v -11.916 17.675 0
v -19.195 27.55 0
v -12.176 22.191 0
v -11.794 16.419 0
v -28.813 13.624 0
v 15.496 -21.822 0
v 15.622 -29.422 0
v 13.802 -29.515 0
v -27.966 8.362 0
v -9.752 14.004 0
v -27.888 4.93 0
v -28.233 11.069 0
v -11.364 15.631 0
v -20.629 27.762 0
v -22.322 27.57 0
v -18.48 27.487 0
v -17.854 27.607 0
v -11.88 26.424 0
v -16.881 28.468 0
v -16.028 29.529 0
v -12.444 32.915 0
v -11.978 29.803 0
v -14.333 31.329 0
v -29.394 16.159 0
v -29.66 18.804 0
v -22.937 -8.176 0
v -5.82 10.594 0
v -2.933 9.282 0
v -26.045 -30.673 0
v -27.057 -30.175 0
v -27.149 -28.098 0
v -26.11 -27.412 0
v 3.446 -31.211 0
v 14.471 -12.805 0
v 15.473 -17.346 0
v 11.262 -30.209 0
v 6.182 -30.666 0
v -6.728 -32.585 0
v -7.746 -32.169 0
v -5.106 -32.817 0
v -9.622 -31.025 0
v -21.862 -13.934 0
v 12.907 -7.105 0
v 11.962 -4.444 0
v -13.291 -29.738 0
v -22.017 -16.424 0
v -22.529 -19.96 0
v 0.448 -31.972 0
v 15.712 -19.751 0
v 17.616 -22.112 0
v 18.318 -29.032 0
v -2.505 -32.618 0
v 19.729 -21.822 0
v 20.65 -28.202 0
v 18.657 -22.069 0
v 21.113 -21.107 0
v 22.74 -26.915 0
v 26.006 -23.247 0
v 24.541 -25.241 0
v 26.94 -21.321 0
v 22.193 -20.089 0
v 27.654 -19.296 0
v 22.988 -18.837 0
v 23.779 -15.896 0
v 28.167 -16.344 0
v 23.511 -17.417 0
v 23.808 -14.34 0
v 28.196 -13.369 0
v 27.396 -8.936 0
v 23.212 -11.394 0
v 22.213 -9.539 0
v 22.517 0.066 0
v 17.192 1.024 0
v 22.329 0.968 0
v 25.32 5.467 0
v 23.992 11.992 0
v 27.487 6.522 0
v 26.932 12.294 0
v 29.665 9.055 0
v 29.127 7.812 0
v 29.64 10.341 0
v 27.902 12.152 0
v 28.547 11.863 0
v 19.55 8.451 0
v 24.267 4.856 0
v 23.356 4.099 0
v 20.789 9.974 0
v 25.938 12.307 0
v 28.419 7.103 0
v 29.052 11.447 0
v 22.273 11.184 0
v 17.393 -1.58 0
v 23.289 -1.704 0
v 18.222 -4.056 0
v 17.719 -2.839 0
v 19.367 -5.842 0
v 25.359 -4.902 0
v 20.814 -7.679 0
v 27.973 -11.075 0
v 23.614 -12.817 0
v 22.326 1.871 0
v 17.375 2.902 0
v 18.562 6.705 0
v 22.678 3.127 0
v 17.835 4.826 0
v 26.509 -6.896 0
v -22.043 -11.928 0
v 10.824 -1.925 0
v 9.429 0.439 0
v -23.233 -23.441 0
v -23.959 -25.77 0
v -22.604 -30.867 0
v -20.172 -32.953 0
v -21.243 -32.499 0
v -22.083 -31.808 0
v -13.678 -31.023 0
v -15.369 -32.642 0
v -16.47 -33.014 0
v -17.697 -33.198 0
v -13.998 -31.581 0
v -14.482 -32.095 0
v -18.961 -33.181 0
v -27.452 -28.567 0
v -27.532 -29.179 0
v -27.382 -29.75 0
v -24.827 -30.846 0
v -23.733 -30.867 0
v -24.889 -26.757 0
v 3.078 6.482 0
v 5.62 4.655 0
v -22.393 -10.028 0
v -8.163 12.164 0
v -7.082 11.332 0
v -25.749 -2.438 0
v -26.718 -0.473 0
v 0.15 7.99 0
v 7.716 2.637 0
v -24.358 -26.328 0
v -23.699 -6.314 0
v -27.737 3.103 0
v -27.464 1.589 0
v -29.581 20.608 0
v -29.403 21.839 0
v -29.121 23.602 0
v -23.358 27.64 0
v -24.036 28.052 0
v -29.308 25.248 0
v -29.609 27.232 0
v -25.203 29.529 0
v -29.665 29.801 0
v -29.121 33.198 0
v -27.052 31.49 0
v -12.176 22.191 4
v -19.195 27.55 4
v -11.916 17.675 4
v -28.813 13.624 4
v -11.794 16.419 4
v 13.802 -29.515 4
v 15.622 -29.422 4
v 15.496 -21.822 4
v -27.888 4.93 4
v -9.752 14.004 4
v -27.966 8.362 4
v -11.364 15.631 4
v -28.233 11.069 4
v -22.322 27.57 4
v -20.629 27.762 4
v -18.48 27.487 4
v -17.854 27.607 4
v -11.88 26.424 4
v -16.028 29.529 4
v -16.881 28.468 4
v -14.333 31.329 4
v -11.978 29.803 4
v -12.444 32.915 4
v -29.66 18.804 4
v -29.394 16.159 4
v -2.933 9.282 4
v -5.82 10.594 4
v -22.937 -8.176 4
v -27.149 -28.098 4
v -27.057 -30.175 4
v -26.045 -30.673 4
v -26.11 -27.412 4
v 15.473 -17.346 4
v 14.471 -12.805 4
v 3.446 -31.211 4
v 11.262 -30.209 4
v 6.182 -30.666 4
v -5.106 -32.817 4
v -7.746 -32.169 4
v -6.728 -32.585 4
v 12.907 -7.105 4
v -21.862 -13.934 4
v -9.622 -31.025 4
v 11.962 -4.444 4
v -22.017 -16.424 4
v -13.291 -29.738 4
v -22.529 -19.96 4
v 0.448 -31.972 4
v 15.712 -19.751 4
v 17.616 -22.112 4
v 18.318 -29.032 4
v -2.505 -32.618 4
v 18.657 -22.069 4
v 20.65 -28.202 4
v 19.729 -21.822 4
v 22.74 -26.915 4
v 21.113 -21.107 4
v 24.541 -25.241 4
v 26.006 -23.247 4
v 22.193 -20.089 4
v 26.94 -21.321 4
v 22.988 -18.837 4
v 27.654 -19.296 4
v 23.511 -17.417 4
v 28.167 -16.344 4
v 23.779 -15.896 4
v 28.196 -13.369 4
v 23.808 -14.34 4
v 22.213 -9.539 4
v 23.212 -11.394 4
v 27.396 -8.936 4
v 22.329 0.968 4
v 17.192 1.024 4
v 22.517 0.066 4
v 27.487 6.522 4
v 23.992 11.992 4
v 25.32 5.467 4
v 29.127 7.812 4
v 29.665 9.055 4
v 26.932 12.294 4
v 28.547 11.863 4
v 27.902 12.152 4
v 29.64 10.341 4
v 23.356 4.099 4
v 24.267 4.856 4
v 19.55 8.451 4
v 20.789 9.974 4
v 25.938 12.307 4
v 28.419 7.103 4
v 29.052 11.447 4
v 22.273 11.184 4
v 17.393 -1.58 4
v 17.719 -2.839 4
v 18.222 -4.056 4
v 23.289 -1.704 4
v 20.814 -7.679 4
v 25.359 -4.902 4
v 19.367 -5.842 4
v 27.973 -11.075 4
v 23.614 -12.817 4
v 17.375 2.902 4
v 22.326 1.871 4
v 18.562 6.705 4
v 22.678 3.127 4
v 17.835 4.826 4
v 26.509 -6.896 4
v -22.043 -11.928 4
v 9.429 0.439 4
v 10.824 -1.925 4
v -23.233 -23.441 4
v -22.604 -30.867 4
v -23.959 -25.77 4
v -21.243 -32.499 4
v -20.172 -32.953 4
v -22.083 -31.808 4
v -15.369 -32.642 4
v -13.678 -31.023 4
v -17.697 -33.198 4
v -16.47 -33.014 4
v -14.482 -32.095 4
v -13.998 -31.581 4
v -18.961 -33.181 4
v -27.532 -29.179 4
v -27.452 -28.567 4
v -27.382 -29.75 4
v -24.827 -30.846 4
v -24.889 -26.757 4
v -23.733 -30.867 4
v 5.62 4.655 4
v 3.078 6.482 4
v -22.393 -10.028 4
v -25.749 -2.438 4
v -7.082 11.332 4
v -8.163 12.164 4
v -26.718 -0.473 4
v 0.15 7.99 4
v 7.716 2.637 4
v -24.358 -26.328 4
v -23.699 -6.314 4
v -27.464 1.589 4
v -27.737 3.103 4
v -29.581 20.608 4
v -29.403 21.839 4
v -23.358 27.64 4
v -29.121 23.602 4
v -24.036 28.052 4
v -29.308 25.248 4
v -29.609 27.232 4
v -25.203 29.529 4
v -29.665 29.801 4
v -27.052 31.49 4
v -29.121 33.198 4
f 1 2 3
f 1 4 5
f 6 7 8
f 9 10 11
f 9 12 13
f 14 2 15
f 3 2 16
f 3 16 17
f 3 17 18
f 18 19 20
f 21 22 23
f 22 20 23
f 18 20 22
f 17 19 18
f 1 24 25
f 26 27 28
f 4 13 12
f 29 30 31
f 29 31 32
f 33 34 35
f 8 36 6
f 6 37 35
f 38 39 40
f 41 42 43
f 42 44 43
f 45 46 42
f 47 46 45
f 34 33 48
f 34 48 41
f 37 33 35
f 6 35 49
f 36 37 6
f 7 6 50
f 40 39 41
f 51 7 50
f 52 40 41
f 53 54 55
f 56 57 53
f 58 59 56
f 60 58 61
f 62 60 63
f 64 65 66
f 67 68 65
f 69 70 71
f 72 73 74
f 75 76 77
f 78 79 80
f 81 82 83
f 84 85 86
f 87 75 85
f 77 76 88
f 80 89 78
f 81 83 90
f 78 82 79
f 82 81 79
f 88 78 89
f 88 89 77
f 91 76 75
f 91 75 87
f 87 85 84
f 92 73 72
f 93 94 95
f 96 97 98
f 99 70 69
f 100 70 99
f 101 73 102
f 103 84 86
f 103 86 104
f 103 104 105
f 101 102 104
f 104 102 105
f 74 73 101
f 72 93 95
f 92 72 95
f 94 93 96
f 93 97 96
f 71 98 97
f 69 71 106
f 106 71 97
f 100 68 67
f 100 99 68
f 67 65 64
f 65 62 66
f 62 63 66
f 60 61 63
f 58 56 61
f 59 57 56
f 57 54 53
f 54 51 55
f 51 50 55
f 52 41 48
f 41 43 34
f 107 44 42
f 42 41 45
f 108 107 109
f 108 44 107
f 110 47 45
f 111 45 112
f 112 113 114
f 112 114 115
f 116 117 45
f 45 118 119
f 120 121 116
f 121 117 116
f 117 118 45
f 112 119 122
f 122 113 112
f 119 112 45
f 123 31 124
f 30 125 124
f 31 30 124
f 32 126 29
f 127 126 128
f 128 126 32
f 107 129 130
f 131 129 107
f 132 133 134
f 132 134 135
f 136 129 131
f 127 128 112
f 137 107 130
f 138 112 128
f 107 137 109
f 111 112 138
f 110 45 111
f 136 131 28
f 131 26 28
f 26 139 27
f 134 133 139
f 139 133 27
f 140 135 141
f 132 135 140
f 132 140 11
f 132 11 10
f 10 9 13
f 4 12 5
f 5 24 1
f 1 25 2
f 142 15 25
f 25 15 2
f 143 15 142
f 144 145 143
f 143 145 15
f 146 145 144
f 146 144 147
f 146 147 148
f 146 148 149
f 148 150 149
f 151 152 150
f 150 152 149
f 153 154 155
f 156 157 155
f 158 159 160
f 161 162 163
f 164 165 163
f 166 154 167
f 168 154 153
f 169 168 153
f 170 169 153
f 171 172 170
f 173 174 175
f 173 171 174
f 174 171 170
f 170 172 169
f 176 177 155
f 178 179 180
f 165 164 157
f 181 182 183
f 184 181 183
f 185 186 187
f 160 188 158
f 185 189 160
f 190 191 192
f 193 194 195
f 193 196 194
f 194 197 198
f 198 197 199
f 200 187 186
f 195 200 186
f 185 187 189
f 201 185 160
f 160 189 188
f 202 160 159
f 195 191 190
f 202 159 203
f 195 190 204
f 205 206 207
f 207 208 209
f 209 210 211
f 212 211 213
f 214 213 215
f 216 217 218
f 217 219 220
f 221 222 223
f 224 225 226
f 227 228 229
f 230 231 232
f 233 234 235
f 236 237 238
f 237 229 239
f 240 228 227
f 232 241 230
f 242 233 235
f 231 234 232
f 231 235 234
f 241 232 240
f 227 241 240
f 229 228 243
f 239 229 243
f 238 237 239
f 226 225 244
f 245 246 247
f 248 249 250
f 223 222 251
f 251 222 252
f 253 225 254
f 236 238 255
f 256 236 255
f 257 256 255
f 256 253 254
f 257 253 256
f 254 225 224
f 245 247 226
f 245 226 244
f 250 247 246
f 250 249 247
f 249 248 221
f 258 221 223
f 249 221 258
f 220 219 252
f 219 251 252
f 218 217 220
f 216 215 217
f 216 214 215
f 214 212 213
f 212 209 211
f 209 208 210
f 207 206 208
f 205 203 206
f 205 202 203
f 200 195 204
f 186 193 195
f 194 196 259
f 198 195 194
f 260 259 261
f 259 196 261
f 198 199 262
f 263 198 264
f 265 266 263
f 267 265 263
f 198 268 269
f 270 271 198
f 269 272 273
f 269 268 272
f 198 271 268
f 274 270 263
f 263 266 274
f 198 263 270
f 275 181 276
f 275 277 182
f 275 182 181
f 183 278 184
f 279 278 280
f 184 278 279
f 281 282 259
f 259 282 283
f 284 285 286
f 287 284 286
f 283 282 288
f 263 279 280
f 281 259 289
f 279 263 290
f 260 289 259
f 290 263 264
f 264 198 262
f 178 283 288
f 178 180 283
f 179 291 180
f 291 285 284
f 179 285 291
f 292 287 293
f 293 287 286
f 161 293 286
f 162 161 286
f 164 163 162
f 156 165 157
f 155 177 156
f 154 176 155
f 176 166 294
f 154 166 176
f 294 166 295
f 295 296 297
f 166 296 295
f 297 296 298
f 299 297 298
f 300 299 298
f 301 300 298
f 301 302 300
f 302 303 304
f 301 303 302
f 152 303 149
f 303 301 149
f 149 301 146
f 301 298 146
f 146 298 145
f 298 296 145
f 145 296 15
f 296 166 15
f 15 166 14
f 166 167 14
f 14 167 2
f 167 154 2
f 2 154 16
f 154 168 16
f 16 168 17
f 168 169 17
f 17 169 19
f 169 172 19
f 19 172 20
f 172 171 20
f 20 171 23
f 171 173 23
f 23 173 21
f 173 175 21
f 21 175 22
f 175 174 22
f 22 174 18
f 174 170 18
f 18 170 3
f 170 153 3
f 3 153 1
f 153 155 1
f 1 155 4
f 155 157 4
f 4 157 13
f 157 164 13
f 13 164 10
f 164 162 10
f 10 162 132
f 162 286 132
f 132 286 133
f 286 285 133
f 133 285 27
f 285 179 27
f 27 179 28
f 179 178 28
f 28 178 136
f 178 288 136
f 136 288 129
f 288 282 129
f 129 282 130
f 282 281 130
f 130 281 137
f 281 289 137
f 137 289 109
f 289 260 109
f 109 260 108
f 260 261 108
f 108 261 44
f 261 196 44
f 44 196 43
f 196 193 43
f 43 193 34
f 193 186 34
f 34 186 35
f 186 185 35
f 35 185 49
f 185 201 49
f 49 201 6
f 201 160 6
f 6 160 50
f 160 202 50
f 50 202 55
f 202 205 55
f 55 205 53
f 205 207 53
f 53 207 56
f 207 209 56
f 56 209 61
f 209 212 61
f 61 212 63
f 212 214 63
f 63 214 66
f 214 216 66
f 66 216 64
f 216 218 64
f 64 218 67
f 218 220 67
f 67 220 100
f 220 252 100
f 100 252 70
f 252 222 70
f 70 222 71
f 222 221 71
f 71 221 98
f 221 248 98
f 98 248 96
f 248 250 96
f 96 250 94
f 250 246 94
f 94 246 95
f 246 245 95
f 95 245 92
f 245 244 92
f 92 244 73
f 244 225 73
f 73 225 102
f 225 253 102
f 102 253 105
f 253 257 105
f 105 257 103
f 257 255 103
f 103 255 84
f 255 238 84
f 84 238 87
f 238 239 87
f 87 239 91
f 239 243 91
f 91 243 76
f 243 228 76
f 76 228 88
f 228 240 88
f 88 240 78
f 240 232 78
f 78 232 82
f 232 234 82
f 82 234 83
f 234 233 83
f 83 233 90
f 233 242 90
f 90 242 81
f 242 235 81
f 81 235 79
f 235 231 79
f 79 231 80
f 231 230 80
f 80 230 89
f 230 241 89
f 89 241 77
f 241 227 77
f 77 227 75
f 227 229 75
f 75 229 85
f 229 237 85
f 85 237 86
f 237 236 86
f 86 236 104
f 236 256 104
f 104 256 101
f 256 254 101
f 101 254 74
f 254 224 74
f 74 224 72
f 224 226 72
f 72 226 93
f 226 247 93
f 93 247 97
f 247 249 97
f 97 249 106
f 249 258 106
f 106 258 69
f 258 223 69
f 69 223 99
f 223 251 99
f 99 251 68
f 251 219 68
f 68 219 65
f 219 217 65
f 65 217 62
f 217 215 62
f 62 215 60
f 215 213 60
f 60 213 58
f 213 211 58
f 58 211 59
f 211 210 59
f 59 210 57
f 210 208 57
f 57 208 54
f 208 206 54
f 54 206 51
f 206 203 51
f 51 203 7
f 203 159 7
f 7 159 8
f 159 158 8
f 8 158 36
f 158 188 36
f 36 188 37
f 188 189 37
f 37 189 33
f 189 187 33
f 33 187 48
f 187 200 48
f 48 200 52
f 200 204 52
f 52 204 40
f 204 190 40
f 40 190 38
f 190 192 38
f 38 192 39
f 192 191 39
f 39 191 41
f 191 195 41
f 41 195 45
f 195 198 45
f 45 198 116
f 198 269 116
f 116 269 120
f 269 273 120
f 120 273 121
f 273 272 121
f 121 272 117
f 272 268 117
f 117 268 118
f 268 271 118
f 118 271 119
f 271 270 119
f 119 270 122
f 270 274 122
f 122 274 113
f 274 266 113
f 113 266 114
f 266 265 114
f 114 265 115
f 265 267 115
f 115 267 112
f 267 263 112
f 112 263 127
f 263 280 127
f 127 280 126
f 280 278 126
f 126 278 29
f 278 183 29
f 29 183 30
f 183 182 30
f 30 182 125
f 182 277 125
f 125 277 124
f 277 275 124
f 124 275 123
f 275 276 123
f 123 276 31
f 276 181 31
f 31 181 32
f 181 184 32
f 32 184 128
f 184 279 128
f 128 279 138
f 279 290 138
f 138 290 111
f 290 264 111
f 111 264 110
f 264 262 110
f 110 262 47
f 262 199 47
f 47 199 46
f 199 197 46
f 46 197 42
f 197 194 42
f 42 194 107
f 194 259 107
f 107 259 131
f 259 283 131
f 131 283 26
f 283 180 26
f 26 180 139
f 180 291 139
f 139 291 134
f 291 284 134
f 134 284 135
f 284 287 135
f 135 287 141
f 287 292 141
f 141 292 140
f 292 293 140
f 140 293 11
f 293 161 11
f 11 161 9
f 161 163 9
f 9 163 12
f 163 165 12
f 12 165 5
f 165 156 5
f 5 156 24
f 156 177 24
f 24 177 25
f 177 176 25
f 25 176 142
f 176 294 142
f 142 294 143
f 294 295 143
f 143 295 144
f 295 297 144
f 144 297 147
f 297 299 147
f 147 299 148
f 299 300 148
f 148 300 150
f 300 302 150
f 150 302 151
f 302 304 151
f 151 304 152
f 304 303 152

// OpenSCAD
// Module names are of the form poly_<inkscape-path-id>().  As a result,
// you can associate a polygon in this OpenSCAD program with the corresponding
// SVG element in the Inkscape document by looking for the XML element with
// the attribute id="inkscape-path-id".

// fudge value is used to ensure that subtracted solids are a tad taller
// in the z dimension than the polygon being subtracted from.  This helps
// keep the resulting .stl file manifold.
fudge = 0.1;

module cat(h)
{
  scale([25.4/90, -25.4/90, 1]) union()
  {
    linear_extrude(height=h)
      polygon([[-89.303594,-104.629248],[-85.166094,-99.396748],[-82.764531,-97.935498],[-79.093594,-97.689248],[-73.093594,-98.369248],[-68.013594,-97.617998],[-65.480156,-97.394717],[-63.263594,-97.819248],[-59.814844,-100.871748],[-56.793594,-104.629248],[-50.784844,-111.007998],[-44.093594,-116.629248],[-42.441094,-105.601748],[-42.093594,-93.629248],[-43.143594,-78.629248],[-42.223594,-62.629248],[-41.788750,-58.176279],[-40.267344,-55.385498],[-34.553594,-49.619248],[-28.923594,-43.099248],[-25.092051,-40.151104],[-20.623125,-37.536592],[-10.392344,-32.887998],[0.530312,-28.312529],[10.906406,-22.969248],[19.912305,-16.495576],[27.339219,-9.343623],[33.410977,-1.556982],[38.351406,6.820752],[42.384336,15.745986],[45.733594,25.175127],[51.276406,45.370752],[54.823906,61.462002],[55.672344,69.984346],[54.906406,77.320752],[62.417656,78.348252],[66.107187,78.198252],[69.906406,77.320752],[74.808086,74.786826],[78.637969,71.183096],[81.452070,66.746631],[83.306406,61.714502],[84.256992,56.323779],[84.359844,50.811533],[83.670977,45.414834],[82.246406,40.370752],[78.707656,33.798096],[73.751406,27.209502],[68.622656,20.701533],[64.566406,14.370752],[62.782500,10.057783],[61.627656,5.599502],[60.916406,-3.629248],[61.565508,-10.284189],[63.193594,-17.100029],[65.771836,-23.759541],[69.271406,-29.945498],[73.663477,-35.340674],[78.919219,-39.627842],[85.009805,-42.489775],[91.906406,-43.609248],[95.427656,-43.562998],[98.866406,-43.059248],[101.152480,-42.035400],[102.940625,-40.559092],[105.022656,-36.640498],[105.111563,-32.086279],[103.206406,-27.679248],[100.696758,-25.168994],[97.396094,-23.109092],[89.716406,-19.370498],[85.984727,-17.206885],[82.756719,-14.523779],[80.356055,-11.078721],[79.106406,-6.629248],[79.120020,-3.430732],[79.783437,-0.235498],[82.520156,6.038252],[89.856406,17.370752],[93.929844,24.436221],[97.071406,31.662002],[99.117969,39.242158],[99.906406,47.370752],[99.805156,57.912002],[97.986406,68.370752],[95.456406,75.547002],[92.146406,82.370752],[86.956406,89.436846],[80.573906,95.369502],[73.167656,99.927783],[64.906406,102.870752],[55.353906,104.250752],[48.906406,104.580752],[39.906406,107.040752],[21.906406,108.660752],[12.209687,110.591064],[1.587656,113.288252],[-8.875000,115.576689],[-18.093594,116.280752],[-23.837813,115.457314],[-27.447344,113.983252],[-34.093594,109.930752],[-47.093594,105.370752],[-48.464844,109.924502],[-49.598125,111.902783],[-51.313594,113.720752],[-54.457051,115.659678],[-58.360000,116.977158],[-62.707559,117.629248],[-67.184844,117.572002],[-71.476973,116.761475],[-75.269063,115.153721],[-78.246230,112.704795],[-80.093594,109.370752],[-84.093594,109.370752],[-87.971406,109.297002],[-92.286094,108.683252],[-95.869531,106.918252],[-97.021992,105.413018],[-97.553594,103.390752],[-97.271699,101.220811],[-96.198438,99.561221],[-92.517344,97.129502],[-88.189375,94.808408],[-86.307520,93.287100],[-84.893594,91.310752],[-82.320781,83.058877],[-79.828594,70.723252],[-78.011406,58.196377],[-77.463594,49.370752],[-78.103906,42.263564],[-79.346094,35.533252],[-81.274531,28.971689],[-83.973594,22.370752],[-91.236094,8.637002],[-94.669531,1.674971],[-97.313594,-5.629248],[-98.282188,-10.995029],[-98.814844,-17.467998],[-99.093594,-29.629248],[-100.036719,-39.220029],[-102.093594,-48.275498],[-104.150469,-57.257842],[-105.093594,-66.629248],[-104.814844,-73.019092],[-104.183594,-77.382998],[-103.183594,-83.629248],[-103.848750,-89.460654],[-104.912344,-96.492998],[-105.111563,-105.593467],[-103.183594,-117.629248],[-95.853594,-111.579248],[-89.303594,-104.629248]]);
  }
}

cat(4);
